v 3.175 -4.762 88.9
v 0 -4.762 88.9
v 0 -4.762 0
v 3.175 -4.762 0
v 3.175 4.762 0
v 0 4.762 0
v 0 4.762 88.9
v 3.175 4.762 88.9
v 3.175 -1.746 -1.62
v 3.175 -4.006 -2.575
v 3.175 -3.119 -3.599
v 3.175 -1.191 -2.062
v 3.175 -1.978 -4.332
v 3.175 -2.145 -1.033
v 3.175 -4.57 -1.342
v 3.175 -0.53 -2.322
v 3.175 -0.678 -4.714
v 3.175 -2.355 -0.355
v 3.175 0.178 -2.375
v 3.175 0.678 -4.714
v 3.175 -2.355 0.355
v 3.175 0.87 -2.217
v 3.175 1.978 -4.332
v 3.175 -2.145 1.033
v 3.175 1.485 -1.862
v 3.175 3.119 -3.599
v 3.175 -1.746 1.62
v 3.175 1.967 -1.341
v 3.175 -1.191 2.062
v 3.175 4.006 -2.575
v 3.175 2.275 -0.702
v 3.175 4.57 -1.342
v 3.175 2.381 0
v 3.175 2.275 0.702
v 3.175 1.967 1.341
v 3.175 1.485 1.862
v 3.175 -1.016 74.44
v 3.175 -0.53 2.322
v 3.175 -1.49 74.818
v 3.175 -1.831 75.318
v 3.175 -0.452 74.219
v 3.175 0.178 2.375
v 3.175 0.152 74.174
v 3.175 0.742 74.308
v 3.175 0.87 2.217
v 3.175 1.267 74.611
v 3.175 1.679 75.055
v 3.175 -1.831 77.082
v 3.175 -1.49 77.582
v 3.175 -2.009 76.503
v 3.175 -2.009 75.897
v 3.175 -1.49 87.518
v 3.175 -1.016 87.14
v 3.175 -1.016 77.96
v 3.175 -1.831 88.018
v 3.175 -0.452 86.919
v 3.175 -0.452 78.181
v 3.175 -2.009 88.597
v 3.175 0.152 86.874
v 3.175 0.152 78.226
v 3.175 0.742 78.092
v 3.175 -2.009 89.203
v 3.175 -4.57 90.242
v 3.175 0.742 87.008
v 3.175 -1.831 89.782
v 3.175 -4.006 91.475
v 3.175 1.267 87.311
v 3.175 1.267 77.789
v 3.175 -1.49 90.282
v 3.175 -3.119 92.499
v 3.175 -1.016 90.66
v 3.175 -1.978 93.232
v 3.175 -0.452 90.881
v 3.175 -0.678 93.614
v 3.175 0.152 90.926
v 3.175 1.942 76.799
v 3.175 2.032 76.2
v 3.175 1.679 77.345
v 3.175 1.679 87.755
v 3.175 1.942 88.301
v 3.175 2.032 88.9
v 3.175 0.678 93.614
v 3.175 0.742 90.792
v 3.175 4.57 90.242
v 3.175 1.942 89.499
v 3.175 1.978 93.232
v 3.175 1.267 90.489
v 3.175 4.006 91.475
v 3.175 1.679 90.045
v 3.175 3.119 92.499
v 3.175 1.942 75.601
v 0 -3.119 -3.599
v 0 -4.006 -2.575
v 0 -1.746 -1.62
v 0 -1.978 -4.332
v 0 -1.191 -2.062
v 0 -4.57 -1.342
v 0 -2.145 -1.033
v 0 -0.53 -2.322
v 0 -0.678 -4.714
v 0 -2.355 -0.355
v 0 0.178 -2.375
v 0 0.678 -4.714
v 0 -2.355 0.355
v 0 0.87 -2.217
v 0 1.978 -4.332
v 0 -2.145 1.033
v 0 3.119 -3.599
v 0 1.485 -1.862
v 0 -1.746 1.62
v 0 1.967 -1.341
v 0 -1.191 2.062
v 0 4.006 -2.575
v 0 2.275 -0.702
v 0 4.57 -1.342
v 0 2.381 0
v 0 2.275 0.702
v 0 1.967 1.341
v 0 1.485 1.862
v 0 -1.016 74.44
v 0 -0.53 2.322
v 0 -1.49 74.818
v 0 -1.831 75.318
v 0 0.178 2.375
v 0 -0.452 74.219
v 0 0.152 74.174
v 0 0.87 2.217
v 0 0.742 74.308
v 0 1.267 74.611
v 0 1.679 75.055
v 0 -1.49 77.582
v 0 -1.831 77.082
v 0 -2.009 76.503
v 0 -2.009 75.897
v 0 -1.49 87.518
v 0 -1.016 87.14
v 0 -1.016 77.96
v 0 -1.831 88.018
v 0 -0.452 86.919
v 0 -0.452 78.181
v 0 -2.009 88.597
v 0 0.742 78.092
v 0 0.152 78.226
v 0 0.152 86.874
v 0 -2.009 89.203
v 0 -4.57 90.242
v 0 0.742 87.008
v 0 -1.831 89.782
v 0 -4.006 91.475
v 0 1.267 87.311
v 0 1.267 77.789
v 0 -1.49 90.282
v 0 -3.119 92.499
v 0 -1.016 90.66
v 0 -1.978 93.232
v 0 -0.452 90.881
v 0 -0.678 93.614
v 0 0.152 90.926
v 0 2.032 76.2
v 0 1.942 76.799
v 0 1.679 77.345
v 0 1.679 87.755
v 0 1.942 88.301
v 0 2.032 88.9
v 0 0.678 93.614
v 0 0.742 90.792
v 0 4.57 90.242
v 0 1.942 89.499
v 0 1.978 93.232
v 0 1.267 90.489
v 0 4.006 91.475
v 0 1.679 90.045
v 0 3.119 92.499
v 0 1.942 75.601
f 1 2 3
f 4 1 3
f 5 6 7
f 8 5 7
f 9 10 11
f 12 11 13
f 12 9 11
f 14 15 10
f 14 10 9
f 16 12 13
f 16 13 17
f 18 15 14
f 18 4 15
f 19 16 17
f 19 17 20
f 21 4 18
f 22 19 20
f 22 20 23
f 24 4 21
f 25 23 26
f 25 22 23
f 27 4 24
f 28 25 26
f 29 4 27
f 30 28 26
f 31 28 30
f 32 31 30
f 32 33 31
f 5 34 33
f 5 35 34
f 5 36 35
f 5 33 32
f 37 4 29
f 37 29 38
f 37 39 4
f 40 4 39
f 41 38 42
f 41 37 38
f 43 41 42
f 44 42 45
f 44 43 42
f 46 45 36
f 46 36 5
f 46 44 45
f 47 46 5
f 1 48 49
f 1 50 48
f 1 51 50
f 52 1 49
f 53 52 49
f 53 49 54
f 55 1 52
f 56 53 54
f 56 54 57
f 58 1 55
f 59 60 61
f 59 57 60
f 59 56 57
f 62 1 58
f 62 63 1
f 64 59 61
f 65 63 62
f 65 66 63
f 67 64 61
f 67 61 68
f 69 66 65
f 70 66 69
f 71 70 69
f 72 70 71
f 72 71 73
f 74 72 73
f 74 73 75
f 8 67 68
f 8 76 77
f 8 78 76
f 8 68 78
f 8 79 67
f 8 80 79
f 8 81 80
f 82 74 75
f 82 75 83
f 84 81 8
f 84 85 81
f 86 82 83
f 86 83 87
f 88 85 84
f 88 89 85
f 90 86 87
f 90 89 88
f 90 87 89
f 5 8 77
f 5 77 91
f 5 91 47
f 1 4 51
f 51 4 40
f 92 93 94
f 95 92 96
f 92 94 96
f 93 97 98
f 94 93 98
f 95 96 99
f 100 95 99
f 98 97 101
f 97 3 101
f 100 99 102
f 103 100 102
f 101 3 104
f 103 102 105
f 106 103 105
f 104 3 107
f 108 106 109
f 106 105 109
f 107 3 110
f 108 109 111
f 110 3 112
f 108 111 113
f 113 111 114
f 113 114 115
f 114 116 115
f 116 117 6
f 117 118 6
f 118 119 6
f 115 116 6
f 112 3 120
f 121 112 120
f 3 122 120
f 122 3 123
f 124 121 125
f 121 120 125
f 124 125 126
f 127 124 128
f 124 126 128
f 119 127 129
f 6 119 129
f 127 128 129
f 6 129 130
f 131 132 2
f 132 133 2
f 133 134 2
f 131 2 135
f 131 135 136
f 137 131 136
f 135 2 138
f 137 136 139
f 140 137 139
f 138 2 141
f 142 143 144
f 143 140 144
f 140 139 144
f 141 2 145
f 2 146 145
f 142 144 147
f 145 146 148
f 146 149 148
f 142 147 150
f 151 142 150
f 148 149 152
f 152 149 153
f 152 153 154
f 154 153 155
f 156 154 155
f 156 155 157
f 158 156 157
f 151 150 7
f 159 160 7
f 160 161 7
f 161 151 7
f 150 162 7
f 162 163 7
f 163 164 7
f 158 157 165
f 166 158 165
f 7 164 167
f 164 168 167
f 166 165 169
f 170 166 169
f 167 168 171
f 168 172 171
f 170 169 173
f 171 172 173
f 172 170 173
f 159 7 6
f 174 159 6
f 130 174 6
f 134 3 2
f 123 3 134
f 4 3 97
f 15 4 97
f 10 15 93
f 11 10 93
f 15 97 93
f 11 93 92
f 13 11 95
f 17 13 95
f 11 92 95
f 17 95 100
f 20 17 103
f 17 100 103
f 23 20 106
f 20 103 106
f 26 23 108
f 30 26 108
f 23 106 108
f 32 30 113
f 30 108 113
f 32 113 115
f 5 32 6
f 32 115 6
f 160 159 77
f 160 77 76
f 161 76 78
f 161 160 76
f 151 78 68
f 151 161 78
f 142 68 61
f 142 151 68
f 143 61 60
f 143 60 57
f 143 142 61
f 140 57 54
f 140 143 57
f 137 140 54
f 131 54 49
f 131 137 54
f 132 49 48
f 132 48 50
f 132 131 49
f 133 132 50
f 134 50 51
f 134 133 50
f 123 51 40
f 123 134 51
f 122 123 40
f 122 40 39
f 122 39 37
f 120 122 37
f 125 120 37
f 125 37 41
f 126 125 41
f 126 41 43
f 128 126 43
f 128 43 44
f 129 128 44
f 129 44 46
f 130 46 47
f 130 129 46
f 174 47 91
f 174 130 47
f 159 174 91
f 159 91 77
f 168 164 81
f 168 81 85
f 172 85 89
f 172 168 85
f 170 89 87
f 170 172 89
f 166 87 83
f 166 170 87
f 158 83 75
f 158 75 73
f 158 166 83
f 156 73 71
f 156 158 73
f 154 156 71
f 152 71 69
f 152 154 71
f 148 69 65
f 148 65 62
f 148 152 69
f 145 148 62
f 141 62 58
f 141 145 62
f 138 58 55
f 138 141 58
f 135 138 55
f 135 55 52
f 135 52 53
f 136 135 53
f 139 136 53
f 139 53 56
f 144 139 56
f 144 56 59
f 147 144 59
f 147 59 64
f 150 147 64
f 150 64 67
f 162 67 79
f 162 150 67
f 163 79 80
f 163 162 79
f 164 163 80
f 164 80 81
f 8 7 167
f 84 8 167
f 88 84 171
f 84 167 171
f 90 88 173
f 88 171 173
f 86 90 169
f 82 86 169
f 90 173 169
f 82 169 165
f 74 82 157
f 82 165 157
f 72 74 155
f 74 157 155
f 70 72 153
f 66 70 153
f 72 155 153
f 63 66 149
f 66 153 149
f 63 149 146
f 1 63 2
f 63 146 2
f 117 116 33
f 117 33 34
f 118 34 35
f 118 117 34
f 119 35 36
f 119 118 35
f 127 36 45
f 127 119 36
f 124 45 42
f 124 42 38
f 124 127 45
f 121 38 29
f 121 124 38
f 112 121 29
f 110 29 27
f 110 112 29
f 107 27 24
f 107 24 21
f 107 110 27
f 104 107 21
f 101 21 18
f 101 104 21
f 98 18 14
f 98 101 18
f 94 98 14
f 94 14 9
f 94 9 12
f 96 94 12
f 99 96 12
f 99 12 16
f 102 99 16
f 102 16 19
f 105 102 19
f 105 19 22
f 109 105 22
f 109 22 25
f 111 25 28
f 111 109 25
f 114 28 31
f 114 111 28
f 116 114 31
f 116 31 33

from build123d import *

# Parameters (mm, degrees)
F0_R     = 2.032
F0_R_2   = 2.38125
F1_DEPTH = 3.175


with BuildPart() as f1:
    # F0 (on Right) → F1 (new body)
    with BuildSketch(Plane.YZ):
        with BuildLine():
            Line((4.7625, 0), (4.7625, 88.9))
            ThreePointArc((4.7625, 88.9), (0, 93.6625), (-4.7625, 88.9))
            Line((-4.7625, 88.9), (-4.7625, 0))
            ThreePointArc((-4.7625, 0), (0, 4.7625), (4.7625, 0))
        make_face()
        with Locations((0, 76.2)):
            Circle(F0_R, mode=Mode.SUBTRACT)
        with Locations((0, 88.9)):
            Circle(F0_R, mode=Mode.SUBTRACT)
        with BuildLine():
            ThreePointArc((-4.7625, 0), (0, -4.7625), (4.7625, 0))
            ThreePointArc((4.7625, 0), (0, 4.7625), (-4.7625, 0))
        make_face()
        Circle(F0_R_2, mode=Mode.SUBTRACT)
    extrude(amount=F1_DEPTH)


solid = f1.part
